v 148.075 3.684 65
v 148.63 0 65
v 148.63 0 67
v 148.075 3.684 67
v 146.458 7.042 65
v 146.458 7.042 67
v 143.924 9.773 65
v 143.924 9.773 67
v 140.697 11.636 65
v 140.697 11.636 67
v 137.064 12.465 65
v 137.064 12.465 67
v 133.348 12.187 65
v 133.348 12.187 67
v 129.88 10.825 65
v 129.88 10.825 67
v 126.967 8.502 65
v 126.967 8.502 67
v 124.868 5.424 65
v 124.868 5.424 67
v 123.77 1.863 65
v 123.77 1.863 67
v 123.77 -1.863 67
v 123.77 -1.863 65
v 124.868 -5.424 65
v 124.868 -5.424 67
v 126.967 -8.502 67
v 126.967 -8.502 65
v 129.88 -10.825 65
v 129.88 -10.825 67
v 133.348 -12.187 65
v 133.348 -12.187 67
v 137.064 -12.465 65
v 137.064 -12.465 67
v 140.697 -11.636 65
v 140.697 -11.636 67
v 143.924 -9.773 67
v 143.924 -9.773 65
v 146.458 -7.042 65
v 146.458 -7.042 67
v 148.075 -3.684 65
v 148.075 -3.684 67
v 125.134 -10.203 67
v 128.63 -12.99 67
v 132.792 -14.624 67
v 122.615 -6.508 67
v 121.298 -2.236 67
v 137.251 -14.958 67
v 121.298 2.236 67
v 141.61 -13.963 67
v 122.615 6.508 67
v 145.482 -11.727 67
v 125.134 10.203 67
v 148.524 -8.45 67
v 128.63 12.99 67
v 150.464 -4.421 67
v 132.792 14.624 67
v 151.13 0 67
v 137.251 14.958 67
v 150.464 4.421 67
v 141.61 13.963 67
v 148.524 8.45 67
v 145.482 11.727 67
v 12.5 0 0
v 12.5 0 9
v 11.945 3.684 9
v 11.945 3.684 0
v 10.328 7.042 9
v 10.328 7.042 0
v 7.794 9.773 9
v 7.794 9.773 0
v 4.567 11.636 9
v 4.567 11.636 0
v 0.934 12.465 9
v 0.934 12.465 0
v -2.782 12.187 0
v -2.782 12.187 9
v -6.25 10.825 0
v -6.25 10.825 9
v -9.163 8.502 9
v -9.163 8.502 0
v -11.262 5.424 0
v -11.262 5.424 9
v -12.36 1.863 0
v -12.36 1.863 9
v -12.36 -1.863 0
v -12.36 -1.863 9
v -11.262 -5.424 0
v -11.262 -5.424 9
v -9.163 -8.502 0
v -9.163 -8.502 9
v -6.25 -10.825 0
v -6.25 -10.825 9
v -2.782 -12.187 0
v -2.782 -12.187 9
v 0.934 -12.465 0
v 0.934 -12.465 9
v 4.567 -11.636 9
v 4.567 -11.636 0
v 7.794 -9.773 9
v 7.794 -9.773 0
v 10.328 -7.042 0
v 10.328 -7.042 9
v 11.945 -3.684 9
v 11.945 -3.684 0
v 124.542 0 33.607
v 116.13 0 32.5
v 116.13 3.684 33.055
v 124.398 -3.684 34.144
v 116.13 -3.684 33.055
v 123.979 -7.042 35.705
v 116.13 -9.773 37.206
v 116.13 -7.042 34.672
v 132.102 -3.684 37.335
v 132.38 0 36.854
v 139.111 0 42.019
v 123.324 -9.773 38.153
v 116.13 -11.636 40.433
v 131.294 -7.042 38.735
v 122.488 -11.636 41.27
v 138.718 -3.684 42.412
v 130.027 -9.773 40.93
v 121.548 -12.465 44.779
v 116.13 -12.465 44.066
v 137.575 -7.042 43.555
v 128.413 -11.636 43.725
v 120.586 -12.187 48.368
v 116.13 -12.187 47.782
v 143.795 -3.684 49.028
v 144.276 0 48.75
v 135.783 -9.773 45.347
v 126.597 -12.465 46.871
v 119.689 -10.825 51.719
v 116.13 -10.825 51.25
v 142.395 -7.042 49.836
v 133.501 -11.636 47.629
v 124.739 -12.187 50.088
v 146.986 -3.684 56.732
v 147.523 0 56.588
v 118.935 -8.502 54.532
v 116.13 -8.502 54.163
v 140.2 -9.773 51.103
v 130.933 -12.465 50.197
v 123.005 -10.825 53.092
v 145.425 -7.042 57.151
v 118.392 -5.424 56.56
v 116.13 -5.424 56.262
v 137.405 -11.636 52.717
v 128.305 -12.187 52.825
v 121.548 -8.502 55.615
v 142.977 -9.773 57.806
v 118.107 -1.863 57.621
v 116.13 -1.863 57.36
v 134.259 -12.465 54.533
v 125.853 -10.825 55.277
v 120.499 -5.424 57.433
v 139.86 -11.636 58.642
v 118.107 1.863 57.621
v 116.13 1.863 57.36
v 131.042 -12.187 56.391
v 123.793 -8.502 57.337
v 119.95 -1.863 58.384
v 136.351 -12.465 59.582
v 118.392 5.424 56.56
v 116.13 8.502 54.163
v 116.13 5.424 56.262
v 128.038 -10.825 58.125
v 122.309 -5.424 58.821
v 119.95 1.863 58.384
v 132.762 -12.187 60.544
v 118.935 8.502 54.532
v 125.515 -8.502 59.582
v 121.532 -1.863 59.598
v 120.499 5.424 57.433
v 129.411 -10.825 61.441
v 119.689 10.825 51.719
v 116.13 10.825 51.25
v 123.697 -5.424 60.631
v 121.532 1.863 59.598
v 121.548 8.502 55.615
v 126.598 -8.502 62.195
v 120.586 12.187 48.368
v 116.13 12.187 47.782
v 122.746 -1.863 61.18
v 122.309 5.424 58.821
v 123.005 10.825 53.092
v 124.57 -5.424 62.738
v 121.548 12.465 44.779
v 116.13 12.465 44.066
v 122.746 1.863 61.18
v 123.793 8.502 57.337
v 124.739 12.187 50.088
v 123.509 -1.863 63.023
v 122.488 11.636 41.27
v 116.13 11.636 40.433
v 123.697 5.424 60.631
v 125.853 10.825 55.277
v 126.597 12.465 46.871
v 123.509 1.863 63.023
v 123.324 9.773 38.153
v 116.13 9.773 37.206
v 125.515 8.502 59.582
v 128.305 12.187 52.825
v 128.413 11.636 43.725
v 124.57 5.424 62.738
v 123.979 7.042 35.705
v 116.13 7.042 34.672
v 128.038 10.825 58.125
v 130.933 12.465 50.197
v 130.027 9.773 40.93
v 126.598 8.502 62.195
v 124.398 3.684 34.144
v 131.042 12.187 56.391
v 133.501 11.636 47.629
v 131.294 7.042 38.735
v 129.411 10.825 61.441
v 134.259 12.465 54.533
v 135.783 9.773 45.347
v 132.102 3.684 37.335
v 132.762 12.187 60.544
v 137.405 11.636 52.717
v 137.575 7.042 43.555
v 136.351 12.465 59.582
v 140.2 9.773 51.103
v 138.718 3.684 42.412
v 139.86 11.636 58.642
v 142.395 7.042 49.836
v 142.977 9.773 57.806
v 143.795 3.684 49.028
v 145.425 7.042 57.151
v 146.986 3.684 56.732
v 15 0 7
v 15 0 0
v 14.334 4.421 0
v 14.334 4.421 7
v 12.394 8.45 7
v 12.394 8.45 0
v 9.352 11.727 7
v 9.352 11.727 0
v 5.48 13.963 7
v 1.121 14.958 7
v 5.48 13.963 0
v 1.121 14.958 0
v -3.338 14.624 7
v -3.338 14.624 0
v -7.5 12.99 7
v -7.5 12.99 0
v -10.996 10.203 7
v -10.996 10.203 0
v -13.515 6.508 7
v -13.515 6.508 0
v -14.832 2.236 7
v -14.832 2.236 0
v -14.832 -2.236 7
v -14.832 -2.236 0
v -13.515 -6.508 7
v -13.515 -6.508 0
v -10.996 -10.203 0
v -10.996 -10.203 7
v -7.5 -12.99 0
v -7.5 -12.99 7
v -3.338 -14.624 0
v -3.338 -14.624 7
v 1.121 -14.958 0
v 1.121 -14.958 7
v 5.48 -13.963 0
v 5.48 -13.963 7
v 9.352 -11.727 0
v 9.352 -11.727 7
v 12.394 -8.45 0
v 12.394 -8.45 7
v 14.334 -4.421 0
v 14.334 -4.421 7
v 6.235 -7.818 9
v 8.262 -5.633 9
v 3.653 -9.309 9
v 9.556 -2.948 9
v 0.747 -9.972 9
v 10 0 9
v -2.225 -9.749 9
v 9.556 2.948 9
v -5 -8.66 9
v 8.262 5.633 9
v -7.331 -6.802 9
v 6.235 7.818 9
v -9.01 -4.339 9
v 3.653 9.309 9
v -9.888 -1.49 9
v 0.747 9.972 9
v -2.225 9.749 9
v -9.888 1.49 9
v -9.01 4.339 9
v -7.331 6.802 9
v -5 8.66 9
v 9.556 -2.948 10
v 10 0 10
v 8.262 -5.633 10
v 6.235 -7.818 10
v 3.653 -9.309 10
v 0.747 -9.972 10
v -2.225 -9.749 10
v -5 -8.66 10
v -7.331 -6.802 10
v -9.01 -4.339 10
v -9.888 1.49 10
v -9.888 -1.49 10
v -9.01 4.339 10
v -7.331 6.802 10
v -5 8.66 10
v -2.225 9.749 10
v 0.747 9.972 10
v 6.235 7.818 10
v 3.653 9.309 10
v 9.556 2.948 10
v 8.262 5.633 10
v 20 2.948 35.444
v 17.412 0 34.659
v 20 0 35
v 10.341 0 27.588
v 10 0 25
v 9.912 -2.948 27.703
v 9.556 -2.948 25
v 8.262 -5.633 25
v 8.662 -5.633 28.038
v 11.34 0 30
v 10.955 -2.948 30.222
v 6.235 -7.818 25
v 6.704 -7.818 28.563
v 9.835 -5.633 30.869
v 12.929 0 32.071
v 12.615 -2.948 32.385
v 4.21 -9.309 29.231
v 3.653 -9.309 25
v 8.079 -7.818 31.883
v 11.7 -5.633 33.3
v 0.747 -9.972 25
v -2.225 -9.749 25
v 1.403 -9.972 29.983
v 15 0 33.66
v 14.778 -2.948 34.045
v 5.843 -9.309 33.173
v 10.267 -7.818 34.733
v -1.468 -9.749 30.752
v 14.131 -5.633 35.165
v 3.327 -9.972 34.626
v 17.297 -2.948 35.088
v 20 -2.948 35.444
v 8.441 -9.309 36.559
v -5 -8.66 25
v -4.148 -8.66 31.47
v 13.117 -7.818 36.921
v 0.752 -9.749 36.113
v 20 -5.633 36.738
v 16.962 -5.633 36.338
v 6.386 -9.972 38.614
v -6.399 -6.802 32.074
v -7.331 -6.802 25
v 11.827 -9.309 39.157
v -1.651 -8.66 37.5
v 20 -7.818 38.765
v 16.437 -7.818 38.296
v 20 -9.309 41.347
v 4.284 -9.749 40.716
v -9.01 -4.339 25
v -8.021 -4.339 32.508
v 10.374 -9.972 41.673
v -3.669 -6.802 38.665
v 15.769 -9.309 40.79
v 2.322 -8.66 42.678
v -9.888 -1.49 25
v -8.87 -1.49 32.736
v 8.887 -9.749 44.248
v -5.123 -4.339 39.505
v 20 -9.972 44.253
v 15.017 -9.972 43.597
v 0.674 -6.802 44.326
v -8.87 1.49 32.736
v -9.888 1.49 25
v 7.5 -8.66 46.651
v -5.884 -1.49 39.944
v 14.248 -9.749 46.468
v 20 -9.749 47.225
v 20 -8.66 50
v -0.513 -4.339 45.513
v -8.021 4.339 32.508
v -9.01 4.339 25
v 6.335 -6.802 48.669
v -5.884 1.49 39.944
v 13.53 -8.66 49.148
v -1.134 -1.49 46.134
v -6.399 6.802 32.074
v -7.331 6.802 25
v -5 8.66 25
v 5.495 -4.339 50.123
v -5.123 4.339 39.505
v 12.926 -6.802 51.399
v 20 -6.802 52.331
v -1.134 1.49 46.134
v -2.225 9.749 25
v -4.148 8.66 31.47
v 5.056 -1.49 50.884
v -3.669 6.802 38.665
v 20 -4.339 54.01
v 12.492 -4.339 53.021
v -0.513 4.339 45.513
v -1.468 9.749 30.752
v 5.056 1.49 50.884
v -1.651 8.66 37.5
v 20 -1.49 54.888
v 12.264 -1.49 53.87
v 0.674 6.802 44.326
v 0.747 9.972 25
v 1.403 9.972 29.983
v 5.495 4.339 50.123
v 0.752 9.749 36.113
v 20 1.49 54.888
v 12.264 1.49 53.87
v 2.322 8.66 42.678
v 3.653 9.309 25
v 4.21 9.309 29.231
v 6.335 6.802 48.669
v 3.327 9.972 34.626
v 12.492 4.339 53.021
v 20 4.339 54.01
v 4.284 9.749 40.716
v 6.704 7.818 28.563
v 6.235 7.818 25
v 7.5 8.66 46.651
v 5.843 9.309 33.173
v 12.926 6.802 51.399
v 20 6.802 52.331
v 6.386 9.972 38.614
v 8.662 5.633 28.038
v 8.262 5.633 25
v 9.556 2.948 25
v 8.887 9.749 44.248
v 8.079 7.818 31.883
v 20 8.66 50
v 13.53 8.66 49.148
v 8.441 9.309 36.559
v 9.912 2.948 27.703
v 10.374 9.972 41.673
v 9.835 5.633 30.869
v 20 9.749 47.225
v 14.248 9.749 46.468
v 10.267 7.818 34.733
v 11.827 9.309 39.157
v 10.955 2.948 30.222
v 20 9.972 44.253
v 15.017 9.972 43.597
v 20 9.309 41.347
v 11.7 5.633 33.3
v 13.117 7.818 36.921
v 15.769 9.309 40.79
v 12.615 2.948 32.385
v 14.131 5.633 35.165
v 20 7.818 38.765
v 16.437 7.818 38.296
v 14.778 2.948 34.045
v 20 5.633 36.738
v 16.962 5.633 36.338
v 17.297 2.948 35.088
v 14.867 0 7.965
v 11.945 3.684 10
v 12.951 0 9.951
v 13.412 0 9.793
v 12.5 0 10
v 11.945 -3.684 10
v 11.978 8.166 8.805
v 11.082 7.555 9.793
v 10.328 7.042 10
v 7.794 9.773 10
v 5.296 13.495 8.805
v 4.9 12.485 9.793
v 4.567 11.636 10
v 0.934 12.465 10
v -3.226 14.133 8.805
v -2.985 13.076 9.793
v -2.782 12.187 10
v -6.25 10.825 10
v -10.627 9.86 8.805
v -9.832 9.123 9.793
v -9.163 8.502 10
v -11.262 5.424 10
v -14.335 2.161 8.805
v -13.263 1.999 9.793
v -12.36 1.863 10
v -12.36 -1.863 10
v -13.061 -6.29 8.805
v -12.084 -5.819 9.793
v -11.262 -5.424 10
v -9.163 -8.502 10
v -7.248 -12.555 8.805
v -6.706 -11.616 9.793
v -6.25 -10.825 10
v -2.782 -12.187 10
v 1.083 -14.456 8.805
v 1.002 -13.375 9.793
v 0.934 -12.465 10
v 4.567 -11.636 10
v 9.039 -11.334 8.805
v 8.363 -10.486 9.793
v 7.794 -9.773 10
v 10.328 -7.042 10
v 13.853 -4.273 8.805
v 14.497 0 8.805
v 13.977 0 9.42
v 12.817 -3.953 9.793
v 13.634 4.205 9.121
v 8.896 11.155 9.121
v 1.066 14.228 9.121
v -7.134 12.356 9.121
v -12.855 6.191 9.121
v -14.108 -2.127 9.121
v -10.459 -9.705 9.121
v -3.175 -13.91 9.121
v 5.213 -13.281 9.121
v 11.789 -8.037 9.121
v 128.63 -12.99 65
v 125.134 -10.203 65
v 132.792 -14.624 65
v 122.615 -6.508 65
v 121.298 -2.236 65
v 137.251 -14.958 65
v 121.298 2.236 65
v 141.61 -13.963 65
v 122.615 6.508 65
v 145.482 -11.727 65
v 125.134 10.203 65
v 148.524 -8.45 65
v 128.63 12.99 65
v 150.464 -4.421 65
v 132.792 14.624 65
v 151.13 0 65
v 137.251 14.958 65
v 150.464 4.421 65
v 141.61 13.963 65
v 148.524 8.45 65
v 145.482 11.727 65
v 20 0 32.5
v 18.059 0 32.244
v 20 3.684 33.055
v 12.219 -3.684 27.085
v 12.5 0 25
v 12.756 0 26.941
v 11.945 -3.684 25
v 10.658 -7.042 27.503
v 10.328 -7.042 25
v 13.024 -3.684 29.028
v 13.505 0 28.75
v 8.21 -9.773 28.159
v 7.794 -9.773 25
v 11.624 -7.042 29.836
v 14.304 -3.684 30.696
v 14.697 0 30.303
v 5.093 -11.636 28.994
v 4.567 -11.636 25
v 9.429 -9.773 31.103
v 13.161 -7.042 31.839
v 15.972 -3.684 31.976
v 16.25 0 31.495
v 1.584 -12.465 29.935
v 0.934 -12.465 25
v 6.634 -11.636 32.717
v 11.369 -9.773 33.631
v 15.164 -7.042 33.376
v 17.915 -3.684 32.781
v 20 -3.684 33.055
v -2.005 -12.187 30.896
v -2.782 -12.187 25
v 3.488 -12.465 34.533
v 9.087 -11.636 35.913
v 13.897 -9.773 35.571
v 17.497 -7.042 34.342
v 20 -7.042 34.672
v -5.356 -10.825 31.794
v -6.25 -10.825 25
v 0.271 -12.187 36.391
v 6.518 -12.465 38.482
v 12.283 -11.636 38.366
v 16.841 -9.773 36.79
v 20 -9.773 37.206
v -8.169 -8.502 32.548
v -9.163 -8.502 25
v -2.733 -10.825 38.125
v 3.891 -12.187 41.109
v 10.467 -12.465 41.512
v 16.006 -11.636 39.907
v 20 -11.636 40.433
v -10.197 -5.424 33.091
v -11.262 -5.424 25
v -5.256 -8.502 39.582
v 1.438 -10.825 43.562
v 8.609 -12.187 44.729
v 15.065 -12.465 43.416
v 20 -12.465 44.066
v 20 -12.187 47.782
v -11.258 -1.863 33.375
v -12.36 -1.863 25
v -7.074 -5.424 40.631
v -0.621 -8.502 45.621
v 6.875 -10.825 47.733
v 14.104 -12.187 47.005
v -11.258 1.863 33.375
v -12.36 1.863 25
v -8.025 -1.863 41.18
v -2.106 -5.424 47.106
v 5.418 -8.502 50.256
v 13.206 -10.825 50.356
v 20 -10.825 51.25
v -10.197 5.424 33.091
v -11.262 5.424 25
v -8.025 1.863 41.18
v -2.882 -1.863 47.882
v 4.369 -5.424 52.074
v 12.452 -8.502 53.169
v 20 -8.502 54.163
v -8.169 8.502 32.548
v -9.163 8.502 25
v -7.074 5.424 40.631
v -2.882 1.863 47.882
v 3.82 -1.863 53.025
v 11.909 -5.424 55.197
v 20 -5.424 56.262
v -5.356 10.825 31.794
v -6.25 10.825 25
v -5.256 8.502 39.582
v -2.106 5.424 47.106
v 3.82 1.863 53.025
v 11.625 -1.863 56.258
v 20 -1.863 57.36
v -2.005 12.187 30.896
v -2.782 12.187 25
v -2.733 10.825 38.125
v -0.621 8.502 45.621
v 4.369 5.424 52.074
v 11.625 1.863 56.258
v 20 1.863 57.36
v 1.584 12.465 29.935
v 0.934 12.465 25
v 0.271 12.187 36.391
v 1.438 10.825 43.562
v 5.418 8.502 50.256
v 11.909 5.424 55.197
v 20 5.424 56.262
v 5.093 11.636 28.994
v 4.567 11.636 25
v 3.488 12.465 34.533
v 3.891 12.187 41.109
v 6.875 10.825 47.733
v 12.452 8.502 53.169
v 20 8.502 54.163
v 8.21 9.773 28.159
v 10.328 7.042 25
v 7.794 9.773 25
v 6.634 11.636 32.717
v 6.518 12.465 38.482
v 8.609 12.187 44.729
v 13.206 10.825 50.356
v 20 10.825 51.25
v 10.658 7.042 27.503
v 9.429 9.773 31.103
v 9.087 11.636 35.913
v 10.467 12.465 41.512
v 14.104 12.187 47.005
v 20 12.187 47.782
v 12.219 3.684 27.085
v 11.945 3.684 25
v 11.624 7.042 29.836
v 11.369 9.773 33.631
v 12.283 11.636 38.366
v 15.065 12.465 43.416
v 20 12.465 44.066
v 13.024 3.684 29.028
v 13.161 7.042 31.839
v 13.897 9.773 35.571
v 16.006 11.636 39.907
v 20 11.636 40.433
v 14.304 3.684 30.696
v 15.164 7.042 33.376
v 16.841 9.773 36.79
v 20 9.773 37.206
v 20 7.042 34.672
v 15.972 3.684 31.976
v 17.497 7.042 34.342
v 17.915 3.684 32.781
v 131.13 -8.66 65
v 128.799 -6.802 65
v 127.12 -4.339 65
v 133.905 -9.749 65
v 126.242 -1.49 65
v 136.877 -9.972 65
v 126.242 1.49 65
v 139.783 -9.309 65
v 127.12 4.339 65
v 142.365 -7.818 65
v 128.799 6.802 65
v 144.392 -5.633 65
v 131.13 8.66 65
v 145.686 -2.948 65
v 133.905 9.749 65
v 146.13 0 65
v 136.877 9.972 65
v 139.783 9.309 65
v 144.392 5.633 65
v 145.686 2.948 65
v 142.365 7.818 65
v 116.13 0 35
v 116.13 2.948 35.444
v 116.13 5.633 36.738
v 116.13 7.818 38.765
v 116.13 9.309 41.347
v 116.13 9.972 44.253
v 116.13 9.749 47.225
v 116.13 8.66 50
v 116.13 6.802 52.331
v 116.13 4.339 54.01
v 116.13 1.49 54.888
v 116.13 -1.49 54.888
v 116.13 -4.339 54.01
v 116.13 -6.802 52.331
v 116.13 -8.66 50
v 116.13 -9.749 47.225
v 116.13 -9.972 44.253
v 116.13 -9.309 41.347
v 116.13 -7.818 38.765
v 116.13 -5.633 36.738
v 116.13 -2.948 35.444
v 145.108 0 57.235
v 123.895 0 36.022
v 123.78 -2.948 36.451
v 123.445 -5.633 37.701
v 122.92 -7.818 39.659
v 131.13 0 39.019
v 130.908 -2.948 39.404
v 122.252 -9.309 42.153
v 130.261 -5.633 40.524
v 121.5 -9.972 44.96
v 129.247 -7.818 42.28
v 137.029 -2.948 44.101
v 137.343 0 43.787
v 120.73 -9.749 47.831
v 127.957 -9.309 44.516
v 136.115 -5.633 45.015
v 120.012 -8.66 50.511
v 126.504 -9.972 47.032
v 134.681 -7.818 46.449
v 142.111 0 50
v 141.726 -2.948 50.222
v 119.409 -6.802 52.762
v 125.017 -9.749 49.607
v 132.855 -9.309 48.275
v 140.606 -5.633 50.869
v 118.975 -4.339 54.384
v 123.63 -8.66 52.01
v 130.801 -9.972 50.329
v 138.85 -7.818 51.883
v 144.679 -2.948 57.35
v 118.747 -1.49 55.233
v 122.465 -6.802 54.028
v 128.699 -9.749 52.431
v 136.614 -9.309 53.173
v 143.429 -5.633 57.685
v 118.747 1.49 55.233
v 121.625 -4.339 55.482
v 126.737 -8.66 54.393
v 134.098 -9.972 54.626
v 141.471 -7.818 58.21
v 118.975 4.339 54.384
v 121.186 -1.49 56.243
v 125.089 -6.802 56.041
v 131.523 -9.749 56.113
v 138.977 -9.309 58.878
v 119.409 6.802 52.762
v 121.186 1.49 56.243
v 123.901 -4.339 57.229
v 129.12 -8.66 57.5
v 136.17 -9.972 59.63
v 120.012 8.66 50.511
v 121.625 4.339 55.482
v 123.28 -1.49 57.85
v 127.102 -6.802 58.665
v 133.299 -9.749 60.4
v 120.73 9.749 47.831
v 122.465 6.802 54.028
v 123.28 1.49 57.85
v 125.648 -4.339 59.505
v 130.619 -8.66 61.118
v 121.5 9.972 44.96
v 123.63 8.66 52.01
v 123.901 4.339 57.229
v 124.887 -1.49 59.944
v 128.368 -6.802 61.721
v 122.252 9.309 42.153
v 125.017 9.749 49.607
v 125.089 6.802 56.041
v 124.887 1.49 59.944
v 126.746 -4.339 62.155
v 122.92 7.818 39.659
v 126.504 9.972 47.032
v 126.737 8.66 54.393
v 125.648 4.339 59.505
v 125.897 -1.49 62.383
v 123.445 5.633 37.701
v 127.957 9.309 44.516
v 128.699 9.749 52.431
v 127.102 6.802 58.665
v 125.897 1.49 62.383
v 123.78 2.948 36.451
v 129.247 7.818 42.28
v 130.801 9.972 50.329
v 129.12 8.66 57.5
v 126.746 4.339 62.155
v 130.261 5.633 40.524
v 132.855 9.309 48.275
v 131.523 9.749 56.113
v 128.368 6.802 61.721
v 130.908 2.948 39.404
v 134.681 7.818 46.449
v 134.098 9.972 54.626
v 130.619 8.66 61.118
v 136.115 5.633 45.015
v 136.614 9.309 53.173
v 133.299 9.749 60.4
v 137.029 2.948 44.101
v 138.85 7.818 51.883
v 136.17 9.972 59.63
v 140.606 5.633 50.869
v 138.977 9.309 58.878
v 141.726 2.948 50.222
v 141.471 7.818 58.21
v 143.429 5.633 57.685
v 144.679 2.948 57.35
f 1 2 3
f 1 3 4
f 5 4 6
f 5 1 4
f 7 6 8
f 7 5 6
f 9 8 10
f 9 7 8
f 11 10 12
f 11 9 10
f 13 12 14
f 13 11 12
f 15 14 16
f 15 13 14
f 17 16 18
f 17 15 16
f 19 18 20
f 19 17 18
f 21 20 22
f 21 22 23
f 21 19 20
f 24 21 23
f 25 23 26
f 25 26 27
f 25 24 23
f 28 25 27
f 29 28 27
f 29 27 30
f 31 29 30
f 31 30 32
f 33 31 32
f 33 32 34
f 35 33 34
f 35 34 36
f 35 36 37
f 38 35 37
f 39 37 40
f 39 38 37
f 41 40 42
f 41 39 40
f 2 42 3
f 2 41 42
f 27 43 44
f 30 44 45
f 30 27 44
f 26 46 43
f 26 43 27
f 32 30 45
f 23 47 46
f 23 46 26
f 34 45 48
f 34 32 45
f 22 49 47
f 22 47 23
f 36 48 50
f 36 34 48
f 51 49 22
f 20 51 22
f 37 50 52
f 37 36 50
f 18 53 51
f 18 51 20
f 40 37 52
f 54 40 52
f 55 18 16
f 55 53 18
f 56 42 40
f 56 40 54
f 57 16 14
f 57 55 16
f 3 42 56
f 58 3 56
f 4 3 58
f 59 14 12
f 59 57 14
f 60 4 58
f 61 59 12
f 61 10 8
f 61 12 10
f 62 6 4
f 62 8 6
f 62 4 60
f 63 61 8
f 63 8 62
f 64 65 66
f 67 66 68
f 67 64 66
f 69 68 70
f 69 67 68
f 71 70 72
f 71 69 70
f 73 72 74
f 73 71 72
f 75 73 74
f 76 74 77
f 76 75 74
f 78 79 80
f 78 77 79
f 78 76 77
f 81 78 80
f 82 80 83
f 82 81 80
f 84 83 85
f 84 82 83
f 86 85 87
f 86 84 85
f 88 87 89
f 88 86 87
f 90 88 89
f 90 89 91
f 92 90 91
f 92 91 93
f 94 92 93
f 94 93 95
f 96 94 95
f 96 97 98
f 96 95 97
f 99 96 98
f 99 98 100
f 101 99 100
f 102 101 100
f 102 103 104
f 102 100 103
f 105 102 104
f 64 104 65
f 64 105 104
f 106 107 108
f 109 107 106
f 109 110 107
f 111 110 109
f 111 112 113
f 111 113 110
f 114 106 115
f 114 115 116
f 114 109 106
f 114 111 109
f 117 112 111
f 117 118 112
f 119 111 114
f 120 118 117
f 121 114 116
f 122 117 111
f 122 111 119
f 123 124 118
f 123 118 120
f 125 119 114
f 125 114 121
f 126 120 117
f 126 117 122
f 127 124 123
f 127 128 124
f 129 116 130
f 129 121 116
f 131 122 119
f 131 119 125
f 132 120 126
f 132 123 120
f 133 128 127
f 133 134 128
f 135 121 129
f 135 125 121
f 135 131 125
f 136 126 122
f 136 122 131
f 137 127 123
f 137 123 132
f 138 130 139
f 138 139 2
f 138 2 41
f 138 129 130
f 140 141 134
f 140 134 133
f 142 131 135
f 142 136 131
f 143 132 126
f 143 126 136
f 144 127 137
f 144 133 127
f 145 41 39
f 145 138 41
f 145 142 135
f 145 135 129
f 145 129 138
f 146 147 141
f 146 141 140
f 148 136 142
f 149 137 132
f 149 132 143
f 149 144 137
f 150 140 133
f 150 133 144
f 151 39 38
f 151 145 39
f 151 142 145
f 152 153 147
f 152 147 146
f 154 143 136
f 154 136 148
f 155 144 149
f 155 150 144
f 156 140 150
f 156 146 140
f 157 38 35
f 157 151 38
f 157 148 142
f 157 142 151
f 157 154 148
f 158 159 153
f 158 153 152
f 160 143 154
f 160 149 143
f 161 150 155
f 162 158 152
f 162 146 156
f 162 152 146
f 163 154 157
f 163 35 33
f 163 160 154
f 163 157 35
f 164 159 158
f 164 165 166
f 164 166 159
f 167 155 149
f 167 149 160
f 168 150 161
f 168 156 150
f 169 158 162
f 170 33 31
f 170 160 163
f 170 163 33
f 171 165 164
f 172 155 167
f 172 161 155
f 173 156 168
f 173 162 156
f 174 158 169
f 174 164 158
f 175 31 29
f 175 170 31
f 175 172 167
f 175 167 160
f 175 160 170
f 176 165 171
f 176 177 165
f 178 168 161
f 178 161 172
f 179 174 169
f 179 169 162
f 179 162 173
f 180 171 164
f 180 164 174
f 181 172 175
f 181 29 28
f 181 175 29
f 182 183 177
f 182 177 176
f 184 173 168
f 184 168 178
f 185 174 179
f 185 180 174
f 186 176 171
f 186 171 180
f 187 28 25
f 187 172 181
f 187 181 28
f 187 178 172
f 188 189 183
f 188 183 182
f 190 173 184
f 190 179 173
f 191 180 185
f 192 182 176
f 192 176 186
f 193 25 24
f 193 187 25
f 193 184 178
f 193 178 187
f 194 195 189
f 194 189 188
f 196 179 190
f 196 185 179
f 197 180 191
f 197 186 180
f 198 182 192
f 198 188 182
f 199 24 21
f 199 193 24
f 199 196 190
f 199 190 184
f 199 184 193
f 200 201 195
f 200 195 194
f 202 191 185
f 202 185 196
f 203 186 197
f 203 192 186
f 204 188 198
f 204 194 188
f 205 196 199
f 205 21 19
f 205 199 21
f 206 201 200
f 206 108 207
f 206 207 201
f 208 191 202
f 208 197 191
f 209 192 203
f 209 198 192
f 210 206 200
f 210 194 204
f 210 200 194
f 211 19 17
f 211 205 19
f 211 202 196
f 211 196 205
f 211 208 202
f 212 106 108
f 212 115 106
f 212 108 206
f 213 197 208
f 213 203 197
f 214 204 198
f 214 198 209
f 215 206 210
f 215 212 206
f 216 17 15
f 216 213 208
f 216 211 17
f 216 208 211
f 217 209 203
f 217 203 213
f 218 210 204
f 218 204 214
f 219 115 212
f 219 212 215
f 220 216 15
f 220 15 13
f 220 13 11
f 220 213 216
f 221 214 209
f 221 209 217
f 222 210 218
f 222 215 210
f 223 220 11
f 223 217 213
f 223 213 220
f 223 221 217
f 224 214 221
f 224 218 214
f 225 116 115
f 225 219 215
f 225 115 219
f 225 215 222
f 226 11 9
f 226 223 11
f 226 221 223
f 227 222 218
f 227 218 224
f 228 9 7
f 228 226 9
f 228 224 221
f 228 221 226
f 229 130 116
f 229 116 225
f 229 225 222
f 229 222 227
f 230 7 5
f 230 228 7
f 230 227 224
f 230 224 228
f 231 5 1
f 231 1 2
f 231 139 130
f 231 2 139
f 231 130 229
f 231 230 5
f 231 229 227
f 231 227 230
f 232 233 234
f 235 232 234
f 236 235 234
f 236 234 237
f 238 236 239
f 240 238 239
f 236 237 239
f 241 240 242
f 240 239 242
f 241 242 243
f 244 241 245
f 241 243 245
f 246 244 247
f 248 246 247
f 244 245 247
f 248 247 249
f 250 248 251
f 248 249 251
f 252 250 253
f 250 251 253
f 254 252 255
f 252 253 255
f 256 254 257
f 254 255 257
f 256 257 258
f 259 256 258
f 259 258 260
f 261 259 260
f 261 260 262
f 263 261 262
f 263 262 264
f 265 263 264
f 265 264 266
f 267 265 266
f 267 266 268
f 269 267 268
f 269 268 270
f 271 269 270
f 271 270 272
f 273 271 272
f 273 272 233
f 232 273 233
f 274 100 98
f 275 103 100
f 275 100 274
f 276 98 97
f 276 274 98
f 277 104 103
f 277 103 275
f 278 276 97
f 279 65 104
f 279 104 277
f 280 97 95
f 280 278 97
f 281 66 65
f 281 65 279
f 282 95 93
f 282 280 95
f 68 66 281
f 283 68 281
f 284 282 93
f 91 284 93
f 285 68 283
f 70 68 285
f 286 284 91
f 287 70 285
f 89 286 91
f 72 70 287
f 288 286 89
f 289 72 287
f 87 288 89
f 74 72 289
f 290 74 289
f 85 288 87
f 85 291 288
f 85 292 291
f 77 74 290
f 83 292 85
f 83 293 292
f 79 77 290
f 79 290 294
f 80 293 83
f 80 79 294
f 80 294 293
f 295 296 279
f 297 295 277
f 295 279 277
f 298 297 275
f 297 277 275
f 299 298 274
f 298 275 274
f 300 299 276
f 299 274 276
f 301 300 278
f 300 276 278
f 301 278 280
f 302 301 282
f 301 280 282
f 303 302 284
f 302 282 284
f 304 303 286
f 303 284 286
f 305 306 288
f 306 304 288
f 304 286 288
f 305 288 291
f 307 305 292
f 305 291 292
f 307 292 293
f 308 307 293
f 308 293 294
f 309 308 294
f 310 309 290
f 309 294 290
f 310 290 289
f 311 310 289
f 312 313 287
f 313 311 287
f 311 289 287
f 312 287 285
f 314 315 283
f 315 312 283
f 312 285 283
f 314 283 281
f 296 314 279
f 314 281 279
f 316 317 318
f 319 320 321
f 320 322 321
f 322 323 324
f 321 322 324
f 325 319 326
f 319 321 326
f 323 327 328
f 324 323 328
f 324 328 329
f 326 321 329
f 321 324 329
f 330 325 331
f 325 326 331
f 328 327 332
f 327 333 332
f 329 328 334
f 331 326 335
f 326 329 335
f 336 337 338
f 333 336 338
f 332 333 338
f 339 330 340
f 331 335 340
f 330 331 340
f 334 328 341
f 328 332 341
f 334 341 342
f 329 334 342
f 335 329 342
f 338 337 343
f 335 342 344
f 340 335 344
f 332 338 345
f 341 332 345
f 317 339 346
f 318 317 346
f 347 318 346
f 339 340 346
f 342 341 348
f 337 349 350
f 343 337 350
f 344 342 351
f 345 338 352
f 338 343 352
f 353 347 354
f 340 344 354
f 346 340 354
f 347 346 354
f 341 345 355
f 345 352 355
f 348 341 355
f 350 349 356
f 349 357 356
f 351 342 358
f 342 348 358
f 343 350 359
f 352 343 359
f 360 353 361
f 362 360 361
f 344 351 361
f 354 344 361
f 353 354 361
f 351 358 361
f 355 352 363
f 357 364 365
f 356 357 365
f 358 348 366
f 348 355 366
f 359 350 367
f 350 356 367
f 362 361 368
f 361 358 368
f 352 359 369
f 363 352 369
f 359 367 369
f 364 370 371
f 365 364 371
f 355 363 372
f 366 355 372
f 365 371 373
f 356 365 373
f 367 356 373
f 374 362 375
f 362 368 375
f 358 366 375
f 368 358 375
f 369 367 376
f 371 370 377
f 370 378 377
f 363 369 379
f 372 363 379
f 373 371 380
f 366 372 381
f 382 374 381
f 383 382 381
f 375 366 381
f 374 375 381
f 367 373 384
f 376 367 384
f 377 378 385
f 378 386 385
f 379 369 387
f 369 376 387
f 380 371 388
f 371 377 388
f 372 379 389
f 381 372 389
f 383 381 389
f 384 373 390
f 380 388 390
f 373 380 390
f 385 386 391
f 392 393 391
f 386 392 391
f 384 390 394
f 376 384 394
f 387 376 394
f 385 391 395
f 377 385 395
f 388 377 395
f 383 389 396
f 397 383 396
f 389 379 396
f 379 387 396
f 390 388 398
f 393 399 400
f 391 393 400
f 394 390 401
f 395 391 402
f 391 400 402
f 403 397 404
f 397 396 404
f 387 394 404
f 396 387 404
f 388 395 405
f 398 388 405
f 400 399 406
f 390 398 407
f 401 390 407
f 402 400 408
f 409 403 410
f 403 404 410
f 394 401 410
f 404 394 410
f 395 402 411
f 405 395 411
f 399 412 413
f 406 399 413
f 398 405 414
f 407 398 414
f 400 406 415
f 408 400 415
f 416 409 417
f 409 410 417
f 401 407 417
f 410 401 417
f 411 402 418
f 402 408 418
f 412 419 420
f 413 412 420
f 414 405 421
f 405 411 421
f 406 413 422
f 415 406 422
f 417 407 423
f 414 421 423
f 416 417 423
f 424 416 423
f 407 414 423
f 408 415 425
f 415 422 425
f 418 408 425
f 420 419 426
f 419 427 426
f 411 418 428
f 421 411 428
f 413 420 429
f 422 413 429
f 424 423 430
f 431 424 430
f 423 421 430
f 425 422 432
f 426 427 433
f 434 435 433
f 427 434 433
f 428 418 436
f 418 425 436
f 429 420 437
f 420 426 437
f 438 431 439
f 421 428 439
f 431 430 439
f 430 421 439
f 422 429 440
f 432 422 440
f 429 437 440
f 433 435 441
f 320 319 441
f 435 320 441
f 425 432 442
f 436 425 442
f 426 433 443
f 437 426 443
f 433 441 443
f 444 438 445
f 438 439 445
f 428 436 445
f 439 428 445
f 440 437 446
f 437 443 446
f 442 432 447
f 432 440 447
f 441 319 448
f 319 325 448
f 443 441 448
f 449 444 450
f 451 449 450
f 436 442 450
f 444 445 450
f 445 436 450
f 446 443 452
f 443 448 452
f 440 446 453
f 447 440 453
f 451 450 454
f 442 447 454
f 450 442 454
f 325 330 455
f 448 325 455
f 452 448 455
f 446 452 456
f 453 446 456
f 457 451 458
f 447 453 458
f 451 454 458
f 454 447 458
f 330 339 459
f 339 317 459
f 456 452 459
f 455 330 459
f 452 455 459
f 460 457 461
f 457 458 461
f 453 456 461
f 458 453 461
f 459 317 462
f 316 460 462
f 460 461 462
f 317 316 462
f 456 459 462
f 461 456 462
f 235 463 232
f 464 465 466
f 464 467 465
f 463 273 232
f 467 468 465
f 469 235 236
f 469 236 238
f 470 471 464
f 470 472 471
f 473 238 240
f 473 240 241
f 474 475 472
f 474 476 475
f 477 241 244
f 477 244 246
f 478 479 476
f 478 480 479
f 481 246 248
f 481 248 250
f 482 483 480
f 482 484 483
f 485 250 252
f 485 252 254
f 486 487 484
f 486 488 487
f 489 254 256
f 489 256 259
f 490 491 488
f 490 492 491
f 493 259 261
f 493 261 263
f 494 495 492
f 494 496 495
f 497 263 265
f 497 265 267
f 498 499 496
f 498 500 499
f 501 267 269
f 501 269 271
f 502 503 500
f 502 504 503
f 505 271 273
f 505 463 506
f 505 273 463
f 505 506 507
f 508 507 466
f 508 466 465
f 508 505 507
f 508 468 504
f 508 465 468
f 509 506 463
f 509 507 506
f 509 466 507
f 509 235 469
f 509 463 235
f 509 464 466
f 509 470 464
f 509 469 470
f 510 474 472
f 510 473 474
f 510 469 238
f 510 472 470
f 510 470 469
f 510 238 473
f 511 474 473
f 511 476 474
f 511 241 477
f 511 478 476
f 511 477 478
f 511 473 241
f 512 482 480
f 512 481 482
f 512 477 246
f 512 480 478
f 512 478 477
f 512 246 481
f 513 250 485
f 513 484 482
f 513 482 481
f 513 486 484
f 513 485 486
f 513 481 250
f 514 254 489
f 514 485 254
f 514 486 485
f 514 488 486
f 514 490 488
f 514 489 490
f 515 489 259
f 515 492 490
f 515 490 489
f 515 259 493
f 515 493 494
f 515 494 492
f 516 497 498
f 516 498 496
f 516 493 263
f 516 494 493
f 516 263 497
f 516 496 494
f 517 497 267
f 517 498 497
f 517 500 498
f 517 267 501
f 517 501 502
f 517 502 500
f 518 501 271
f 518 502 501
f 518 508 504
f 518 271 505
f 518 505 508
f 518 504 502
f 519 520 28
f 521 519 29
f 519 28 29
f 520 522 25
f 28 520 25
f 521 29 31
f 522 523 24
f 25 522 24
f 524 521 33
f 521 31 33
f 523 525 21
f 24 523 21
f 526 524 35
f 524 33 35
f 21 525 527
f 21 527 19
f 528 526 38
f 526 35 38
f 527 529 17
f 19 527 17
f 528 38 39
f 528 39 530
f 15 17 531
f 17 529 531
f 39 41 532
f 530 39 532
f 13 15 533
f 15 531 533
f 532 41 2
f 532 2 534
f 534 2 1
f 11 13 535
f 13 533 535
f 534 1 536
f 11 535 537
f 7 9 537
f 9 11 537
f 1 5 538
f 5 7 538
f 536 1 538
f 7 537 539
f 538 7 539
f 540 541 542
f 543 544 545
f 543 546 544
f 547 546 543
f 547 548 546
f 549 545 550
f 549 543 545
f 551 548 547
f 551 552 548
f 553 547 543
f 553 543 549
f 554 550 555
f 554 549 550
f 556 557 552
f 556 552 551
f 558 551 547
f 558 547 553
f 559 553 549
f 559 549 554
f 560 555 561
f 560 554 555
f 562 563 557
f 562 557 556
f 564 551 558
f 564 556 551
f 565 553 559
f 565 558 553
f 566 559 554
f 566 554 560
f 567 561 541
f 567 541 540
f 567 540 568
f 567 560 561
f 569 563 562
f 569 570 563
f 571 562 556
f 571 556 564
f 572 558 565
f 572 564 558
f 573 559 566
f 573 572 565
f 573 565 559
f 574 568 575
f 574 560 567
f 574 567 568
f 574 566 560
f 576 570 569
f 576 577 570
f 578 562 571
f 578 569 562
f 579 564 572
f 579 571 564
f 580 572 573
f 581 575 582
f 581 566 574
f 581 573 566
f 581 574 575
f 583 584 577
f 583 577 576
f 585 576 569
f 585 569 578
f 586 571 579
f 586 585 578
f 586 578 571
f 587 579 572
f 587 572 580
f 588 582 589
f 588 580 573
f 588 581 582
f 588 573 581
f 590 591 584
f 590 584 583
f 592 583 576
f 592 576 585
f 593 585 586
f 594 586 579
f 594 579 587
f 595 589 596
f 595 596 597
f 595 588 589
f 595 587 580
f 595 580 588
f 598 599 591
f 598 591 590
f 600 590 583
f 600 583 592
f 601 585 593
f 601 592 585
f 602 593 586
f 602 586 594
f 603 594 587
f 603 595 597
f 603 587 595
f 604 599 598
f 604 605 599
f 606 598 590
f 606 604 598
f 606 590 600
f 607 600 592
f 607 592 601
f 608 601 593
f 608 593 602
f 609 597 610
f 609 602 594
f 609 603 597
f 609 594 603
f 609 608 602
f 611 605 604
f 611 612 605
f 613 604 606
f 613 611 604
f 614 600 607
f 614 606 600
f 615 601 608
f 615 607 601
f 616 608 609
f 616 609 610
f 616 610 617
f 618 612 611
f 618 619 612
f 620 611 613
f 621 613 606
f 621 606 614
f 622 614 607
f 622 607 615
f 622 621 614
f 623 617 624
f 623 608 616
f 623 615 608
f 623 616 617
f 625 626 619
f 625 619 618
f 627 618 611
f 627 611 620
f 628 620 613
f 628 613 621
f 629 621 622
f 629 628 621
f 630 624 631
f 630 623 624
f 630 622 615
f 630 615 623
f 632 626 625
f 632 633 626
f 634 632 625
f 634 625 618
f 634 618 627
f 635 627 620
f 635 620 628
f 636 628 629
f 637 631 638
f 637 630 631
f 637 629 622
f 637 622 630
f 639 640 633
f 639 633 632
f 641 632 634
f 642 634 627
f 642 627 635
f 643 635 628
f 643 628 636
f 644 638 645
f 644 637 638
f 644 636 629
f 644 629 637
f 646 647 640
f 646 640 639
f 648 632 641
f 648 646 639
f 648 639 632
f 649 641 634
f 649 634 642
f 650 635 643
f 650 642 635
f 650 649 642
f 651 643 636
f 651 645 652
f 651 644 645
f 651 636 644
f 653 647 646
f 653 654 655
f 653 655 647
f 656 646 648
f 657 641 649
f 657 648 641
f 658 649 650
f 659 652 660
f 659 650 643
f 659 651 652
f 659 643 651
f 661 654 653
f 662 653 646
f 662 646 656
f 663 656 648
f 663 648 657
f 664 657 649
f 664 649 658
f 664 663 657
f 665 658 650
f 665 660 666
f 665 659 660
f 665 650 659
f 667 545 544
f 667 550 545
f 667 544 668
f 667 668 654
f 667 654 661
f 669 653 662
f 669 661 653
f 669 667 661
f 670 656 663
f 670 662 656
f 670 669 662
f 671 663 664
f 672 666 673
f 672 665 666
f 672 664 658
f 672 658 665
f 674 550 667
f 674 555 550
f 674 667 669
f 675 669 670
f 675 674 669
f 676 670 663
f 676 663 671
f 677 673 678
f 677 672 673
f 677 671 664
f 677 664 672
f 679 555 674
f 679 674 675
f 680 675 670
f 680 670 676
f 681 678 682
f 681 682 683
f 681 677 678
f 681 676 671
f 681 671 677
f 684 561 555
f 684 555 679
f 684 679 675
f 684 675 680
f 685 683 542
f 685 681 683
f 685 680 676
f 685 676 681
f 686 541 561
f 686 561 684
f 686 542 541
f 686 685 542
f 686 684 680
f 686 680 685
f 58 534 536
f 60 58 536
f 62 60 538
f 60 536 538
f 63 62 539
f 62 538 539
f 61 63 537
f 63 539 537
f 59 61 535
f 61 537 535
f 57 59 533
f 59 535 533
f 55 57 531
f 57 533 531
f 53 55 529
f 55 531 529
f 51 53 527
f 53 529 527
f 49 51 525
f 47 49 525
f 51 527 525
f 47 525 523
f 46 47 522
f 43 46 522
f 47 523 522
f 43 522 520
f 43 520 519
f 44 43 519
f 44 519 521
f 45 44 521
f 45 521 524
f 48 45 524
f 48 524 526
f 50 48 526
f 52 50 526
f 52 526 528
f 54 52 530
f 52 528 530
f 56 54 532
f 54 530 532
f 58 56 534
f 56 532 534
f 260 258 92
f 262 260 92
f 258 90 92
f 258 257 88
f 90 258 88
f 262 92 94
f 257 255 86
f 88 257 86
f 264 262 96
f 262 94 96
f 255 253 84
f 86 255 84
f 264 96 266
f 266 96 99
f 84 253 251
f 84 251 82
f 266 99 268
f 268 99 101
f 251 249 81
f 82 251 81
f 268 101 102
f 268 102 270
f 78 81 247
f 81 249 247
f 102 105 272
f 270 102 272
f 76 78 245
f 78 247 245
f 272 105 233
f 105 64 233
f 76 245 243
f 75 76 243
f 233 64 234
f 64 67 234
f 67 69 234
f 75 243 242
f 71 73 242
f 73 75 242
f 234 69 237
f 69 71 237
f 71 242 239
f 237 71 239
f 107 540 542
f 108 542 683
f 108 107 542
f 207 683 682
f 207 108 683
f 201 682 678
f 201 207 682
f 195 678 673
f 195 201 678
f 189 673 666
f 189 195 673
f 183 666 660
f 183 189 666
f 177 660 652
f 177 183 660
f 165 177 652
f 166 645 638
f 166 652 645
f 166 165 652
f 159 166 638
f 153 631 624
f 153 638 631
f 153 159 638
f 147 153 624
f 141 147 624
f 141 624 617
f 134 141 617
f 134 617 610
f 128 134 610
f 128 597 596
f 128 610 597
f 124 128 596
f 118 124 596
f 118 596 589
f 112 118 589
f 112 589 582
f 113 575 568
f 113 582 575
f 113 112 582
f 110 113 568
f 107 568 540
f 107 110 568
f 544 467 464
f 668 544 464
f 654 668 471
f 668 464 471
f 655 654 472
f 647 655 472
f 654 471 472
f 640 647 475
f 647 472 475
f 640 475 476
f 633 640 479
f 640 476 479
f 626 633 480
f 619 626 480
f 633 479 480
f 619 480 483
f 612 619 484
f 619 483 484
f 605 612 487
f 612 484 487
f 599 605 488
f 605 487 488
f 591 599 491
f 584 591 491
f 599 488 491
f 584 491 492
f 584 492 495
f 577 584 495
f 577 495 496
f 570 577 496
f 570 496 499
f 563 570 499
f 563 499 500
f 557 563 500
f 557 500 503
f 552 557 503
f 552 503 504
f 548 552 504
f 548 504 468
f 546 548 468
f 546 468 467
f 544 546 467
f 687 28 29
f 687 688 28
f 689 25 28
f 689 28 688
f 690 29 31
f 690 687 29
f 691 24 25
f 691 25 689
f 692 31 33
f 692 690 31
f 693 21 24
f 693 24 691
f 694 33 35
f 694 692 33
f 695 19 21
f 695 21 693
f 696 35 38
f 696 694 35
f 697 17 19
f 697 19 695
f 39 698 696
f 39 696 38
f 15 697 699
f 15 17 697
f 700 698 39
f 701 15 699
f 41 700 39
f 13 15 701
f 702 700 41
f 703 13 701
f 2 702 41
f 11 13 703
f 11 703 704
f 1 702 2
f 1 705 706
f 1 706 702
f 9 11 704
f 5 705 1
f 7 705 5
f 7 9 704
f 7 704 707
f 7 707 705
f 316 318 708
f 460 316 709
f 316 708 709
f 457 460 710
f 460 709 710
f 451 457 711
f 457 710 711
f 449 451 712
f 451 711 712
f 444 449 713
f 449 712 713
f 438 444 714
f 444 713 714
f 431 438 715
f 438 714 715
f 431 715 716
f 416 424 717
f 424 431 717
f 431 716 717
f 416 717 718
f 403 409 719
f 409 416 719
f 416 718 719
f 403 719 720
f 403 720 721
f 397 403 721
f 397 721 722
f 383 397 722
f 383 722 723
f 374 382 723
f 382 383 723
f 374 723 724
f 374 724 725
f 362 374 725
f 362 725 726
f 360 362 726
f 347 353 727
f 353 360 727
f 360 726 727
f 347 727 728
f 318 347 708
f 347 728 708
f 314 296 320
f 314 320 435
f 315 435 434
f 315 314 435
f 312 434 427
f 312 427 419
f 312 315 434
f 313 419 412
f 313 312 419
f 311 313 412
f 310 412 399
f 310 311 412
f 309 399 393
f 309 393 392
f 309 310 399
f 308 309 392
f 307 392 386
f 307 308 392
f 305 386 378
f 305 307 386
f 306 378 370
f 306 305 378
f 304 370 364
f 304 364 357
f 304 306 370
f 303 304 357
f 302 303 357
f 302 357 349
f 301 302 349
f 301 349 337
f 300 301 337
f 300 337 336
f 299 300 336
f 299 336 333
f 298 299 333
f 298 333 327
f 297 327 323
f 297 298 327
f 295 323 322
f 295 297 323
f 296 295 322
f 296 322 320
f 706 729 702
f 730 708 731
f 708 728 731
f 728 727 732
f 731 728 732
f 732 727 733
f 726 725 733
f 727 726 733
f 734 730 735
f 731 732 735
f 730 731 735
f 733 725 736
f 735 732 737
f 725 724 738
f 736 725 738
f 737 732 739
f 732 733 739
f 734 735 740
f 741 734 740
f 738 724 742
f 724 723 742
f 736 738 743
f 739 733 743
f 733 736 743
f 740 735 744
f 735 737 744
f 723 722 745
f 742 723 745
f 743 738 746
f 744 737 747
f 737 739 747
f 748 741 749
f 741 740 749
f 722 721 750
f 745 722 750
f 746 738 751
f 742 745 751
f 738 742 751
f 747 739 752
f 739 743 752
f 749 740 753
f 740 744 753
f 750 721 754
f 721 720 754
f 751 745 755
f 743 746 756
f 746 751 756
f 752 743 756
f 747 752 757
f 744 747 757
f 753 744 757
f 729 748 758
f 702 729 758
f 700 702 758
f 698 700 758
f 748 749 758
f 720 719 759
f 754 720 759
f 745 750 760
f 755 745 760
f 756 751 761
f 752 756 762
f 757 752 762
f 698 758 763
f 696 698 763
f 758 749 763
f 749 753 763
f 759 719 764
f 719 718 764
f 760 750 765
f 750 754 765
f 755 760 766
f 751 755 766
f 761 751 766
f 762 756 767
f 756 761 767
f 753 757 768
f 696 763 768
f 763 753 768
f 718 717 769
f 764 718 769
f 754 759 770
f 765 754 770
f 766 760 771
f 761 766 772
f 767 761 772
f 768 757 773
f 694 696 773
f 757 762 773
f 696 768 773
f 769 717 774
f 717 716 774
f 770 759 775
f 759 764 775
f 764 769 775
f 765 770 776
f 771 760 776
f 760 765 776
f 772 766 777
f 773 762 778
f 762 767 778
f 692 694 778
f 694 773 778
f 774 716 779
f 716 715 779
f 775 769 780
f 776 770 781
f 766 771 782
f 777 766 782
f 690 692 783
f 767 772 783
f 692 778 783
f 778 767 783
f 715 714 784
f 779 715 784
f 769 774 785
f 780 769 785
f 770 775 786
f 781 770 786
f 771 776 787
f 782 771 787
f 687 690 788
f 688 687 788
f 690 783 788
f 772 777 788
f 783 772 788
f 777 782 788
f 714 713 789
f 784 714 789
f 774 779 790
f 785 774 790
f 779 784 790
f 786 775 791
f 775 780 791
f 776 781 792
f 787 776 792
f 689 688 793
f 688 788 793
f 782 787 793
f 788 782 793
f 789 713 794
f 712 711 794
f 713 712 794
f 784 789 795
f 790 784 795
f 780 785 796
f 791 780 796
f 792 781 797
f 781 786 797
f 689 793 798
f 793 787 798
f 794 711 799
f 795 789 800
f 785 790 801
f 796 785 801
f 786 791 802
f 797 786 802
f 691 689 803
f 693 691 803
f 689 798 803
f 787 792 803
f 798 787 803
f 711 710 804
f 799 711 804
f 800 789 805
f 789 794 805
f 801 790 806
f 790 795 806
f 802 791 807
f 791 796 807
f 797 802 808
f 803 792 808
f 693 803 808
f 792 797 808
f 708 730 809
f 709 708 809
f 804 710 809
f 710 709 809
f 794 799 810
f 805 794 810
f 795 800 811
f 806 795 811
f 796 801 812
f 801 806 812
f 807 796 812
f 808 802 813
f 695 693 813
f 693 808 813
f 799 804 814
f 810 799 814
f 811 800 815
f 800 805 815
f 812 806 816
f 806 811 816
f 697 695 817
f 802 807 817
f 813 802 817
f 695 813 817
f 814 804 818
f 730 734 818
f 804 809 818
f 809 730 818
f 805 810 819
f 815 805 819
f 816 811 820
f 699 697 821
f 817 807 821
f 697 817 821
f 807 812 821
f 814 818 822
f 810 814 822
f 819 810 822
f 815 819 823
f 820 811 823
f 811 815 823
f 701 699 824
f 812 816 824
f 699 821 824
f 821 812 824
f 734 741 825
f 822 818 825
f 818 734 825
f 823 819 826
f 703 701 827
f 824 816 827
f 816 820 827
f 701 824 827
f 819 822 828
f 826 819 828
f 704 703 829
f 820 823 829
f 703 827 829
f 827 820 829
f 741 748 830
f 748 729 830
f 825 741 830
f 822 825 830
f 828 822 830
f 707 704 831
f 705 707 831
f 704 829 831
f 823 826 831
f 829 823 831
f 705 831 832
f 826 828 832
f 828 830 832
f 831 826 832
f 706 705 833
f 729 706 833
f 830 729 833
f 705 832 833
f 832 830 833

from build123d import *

# Parameters (mm, degrees)
CROQUIS1_R              = 15
CROQUIS1_R_2            = 12.5
SALIENTE_EXTRUIR1_DEPTH = 10
CROQUIS2_R              = 12.5
CROQUIS2_R_2            = 10
SALIENTE_EXTRUIR2_DEPTH = 15
REDONDEO3_SIZE          = 3
REDONDEO3_SIZE_2        = 2.5
SALIENTE_EXTRUIR3_START = 1
CROQUIS3_R              = 12.5
CROQUIS3_R_2            = 10
SALIENTE_EXTRUIR3_DEPTH = 1
CROQUIS6_R              = 12.5
CROQUIS6_R_2            = 10
CROQUIS7_R              = 15
CROQUIS7_R_2            = 12.5
SALIENTE_EXTRUIR4_DEPTH = 2


with BuildPart() as part:
    # Croquis1 → Saliente-Extruir1 (new body)
    with BuildSketch(Plane.XY):
        Circle(CROQUIS1_R)
        Circle(CROQUIS1_R_2, mode=Mode.SUBTRACT)
    extrude(amount=SALIENTE_EXTRUIR1_DEPTH)

    # Redondeo3
    # an asymmetric fillet: 3, 2.5 mm, written as the material it takes off along each edge
    with BuildSketch(Plane(origin=(0, 0, 10), x_dir=(1, 0, 0), z_dir=(0, -1, 0))) as redondeo3_piece_1:
        with BuildLine():
            Bezier((15, -REDONDEO3_SIZE), (15, 0), (15 - REDONDEO3_SIZE_2, 0), weights=[1, 0.707106781, 1])
            Line((15 - REDONDEO3_SIZE_2, 0), (15, 0))
            Line((15, 0), (15, -REDONDEO3_SIZE))
        make_face()
    revolve(axis=Axis((0, 0, 10), (0, 0, 1)), mode=Mode.SUBTRACT)



with BuildPart() as body_2:
    # Croquis2 → Saliente-Extruir2 (new body)
    with BuildSketch(Plane.XY.offset(10)):
        Circle(CROQUIS2_R)
        Circle(CROQUIS2_R_2, mode=Mode.SUBTRACT)
    extrude(amount=SALIENTE_EXTRUIR2_DEPTH)


with BuildPart() as part_1:
    add(part.part)

    add(body_2.part)  # Saliente-Extruir3 merges body 2
    # Croquis3 → Saliente-Extruir3 (add)
    with BuildSketch(Plane(origin=(0, 0, 10), x_dir=(-1, 0, 0), z_dir=(0, 0, -1)).offset(SALIENTE_EXTRUIR3_START)):
        Circle(CROQUIS3_R)
        with Locations(Location((0, 0, 0), (0, 0, 180))):
            Circle(CROQUIS3_R_2, mode=Mode.SUBTRACT)
    extrude(amount=-SALIENTE_EXTRUIR3_DEPTH)

    # Barrer1: sweep along a path in Croquis5
    with BuildLine(Plane(origin=(0, 0, 0), x_dir=(1, 0, 0), z_dir=(0, 1, 0))) as barrer1_path:
        ThreePointArc((0, -25), (5.857864376, -39.142135624), (20, -45))
        Line((20, -45), (116.13, -45))
        ThreePointArc((116.13, -45), (130.272135624, -50.857864376), (136.13, -65))
    # Croquis6 → Barrer1 (sweep)
    with BuildSketch(Plane.XY.offset(25)):
        Circle(CROQUIS6_R)
        Circle(CROQUIS6_R_2, mode=Mode.SUBTRACT)
    sweep(path=barrer1_path.line)


with BuildPart() as body_2_2:
    # Croquis7 → Saliente-Extruir4 (new body)
    with BuildSketch(Plane.XY.offset(65)):
        with Locations((136.13, 0)):
            Circle(CROQUIS7_R)
        with Locations((136.13, 0)):
            Circle(CROQUIS7_R_2, mode=Mode.SUBTRACT)
    extrude(amount=SALIENTE_EXTRUIR4_DEPTH)


solid = Compound([part_1.part, body_2_2.part])
